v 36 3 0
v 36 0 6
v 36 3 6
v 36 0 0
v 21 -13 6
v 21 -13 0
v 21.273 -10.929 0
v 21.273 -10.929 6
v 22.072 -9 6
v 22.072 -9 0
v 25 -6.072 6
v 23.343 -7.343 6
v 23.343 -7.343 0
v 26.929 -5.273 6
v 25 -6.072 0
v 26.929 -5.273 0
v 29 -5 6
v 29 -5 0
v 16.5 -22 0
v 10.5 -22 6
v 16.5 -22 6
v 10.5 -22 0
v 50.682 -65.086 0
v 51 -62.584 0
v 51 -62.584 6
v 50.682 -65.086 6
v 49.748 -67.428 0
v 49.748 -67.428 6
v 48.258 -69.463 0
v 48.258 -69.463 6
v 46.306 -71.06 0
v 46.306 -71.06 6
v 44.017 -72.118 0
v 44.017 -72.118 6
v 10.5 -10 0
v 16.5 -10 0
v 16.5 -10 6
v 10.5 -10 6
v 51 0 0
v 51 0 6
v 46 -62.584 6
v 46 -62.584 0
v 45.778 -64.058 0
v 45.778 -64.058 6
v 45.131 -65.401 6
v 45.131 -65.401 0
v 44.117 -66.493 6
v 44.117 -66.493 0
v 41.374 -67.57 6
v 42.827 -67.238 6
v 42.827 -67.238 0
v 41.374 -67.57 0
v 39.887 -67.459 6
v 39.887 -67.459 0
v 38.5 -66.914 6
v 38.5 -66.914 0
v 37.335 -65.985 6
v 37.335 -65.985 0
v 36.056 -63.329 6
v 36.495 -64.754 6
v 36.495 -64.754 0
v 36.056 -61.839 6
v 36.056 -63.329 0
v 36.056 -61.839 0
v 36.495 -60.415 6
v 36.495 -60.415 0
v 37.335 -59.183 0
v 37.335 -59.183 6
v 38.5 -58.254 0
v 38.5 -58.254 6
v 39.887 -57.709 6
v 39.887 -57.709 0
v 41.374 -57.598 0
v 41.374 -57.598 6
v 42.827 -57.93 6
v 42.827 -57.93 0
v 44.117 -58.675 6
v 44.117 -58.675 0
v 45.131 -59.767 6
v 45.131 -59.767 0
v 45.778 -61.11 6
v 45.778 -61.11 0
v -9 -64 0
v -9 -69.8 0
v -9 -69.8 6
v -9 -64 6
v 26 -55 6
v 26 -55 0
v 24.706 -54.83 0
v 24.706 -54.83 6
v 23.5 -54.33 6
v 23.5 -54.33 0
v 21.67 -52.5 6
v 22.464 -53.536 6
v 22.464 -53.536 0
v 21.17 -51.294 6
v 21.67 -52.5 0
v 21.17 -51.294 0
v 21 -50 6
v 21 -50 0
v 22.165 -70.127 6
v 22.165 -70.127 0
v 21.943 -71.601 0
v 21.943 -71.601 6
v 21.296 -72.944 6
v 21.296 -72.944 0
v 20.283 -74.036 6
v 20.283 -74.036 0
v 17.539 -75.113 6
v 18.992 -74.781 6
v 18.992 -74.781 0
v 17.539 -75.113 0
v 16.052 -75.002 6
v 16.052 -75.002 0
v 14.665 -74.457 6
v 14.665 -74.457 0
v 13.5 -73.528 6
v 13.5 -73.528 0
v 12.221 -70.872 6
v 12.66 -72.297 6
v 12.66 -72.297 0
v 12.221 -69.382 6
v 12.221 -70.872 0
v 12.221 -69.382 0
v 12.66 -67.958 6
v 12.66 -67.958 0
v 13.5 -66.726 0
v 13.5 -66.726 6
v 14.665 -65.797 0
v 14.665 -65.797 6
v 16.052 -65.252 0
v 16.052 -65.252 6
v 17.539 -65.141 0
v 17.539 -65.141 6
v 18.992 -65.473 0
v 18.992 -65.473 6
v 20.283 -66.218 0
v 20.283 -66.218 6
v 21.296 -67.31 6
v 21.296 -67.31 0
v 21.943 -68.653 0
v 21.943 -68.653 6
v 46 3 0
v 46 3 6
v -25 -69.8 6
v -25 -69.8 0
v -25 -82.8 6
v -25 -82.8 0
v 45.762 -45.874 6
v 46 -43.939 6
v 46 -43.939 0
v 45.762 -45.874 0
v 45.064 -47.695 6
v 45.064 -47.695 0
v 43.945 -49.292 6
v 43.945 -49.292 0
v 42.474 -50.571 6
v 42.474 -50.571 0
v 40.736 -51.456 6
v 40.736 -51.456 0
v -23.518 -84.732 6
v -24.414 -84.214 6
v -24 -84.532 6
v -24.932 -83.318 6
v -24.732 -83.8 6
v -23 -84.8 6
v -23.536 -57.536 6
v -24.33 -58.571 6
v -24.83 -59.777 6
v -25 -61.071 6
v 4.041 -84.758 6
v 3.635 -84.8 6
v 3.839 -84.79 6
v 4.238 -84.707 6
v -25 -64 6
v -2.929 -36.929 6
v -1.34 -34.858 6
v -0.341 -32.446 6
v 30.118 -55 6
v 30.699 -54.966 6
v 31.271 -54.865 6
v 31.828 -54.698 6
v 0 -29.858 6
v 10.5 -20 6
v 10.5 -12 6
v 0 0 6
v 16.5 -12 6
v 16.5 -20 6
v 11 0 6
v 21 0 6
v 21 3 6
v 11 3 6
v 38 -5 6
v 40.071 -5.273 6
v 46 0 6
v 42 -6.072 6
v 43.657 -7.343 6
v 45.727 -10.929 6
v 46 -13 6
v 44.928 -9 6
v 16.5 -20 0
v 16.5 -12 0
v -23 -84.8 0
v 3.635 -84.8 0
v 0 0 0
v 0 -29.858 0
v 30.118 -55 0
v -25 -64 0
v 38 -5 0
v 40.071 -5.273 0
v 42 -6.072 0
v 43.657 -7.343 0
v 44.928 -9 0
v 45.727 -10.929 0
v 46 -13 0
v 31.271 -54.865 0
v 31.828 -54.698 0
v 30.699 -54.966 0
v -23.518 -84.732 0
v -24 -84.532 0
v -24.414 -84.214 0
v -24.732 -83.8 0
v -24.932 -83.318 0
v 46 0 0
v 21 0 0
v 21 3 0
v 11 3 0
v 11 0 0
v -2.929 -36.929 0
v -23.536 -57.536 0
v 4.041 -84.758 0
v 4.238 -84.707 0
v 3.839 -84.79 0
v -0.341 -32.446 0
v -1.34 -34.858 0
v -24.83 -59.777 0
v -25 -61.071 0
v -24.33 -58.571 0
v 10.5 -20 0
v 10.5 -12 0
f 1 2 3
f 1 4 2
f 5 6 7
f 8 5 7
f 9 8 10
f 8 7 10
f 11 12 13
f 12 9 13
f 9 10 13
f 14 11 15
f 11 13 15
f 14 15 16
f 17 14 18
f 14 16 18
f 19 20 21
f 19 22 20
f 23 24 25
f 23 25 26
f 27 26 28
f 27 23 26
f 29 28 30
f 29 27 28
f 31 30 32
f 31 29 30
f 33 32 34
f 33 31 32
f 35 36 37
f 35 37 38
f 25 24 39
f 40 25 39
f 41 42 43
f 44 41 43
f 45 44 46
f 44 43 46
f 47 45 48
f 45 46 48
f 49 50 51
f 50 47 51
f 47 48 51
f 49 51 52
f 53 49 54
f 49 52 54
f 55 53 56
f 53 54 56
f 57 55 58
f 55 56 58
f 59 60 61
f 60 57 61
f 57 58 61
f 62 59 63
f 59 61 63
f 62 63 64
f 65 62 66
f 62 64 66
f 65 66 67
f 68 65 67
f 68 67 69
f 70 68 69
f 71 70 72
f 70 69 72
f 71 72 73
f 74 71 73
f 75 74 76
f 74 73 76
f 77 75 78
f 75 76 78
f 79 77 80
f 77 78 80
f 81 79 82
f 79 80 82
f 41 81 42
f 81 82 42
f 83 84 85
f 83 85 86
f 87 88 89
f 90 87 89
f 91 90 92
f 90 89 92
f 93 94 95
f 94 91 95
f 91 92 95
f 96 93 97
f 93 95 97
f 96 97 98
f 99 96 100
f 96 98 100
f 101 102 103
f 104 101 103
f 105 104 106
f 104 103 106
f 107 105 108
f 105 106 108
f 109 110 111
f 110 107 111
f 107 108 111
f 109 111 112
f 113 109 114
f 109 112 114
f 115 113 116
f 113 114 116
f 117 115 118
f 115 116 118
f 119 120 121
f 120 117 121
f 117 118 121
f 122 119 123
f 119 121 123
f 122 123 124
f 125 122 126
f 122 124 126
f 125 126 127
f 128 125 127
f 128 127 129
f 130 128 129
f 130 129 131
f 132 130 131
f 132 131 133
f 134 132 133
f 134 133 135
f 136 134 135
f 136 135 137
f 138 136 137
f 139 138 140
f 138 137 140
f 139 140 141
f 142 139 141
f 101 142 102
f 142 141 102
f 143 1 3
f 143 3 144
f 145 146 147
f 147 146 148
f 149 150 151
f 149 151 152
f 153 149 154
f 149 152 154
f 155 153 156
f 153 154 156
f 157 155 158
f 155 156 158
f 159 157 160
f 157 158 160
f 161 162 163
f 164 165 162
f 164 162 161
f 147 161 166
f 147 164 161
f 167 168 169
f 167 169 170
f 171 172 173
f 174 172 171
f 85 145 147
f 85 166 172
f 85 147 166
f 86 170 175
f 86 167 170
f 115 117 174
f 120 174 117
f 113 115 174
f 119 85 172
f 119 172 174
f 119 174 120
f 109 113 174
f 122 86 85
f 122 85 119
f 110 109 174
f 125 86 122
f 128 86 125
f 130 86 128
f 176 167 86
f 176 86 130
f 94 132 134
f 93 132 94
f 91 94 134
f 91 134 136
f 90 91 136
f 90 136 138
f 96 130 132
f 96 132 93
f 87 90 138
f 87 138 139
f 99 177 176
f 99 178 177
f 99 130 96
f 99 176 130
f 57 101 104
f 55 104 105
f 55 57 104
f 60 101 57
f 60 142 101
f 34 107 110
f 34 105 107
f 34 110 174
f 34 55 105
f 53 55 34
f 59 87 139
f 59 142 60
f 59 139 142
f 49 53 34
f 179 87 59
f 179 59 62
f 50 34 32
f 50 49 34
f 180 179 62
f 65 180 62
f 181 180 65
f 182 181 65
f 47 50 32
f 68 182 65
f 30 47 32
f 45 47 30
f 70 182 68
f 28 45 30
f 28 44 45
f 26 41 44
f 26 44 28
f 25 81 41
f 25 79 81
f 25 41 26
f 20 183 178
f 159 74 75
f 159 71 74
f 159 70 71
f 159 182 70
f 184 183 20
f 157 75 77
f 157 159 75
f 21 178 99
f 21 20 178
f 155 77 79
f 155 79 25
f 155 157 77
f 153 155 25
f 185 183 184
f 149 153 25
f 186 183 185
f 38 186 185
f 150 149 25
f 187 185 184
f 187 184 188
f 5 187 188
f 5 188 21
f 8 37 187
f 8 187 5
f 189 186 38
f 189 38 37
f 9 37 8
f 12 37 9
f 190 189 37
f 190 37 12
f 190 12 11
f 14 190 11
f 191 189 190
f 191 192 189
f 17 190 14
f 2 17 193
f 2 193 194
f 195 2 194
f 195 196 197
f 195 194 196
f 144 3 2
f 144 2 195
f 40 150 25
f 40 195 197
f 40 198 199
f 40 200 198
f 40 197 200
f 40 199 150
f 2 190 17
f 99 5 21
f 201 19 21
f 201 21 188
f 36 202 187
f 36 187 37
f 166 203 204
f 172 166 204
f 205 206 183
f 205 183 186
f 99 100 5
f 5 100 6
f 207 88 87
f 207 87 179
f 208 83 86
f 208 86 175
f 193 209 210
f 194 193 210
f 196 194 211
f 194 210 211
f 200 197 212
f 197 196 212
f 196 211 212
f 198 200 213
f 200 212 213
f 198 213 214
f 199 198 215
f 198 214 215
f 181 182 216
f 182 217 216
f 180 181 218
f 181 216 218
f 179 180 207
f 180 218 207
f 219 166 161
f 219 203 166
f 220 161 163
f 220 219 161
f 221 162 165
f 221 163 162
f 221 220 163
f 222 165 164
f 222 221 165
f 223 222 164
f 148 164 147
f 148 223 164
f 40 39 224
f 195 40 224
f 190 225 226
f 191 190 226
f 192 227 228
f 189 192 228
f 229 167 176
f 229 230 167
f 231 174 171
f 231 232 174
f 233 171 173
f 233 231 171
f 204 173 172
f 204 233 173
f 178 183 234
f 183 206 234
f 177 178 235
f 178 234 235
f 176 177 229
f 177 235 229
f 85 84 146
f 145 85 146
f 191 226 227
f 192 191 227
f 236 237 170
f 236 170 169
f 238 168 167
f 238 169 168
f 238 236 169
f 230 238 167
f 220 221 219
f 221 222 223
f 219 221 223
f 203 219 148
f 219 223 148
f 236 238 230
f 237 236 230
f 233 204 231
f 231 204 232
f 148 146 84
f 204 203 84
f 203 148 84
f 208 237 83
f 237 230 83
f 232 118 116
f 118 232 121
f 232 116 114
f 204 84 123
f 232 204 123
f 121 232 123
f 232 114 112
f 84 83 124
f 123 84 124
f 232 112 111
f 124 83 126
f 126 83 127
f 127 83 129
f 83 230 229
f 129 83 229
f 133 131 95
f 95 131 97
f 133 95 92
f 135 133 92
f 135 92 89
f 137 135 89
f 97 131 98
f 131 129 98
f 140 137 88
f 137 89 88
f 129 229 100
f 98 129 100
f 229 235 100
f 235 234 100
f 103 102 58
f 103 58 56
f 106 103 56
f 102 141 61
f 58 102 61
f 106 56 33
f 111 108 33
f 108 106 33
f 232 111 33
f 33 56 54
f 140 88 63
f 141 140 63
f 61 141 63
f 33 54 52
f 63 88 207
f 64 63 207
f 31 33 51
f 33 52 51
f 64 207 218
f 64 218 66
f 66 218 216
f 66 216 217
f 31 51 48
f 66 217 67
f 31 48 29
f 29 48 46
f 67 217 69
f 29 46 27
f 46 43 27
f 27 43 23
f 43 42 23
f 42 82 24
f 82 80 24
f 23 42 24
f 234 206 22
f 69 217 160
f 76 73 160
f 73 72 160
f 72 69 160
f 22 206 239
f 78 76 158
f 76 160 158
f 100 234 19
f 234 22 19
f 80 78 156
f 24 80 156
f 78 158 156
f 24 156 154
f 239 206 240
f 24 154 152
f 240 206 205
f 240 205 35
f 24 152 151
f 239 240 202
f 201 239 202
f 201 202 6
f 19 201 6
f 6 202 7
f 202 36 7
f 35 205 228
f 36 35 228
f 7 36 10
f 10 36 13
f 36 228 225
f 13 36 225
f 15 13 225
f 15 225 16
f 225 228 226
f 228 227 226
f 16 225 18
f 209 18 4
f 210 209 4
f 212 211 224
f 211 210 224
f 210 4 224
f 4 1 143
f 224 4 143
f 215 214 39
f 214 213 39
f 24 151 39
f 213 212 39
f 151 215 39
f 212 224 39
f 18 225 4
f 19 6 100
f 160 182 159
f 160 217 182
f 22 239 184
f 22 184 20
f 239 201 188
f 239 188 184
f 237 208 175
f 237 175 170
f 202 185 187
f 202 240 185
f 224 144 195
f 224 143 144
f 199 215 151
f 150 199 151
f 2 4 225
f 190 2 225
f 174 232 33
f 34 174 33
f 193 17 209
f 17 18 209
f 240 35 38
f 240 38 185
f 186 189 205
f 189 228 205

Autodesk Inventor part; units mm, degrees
ref_plane "YZ Plane" through (0, 0, 0) normal (1, 0, 0) x (0, 1, 0)
ref_plane "XZ Plane" through (0, 0, 0) normal (0, 1, 0) x (-1, 0, 0)
ref_plane "XY Plane" through (0, 0, 0) normal (0, 0, 1) x (1, 0, 0)
sketch "Sketch1" plane through (0, 0, 0) normal (0, 0, 1) x (1, 0, 0)
  line L0 (51, -62.5841) -> (51, 0)
  line L1 (21, 0) -> (21, 3)
  line L2 (21, 3) -> (11, 3)
  line L3 (11, 3) -> (11, 0)
  line L4 (36, 0) -> (36, 3)
  line L5 (36, 3) -> (46, 3)
  line L6 (46, 3) -> (46, 0)
  line L7 (51, 0) -> (46, 0)
  line L8 (36, 0) -> (21, 0)
  line L9 (11, 0) -> (0, 0)
  line L10 (-9, -69.8) -> (-25, -69.8)
  line L11 (-9, -64) -> (-25, -64)
  line L12 (-9, -69.8) -> (-9, -64)
  line L13 (-25, -69.8) -> (-25, -82.8)
  line L14 (29, -5) -> (38, -5)
  line L15 (46, -13) -> (46, -43.9388)
  line L16 (21, -50) -> (21, -13)
  arc A0 (29, -5) -> (21, -13) centre (29, -13) ccw
  arc A1 (46, -13) -> (38, -5) centre (38, -13) ccw
  line L17 (4.2384, -84.7068) -> (44.0172, -72.118)
  line L18 (26, -55) -> (30.1184, -55)
  line L19 (31.8285, -54.6985) -> (40.7362, -51.4563)
  arc A2 (21, -50) -> (26, -55) centre (26, -50) ccw
  arc A3 (30.1184, -55) -> (31.8285, -54.6985) centre (30.1184, -50) ccw
  arc A4 (40.7362, -51.4563) -> (46, -43.9388) centre (38, -43.9388) ccw
  arc A5 (44.0172, -72.118) -> (51, -62.5841) centre (41, -62.5841) ccw
  circle A6 centre (17.1651, -70.1271) radius 5
  circle A7 centre (41, -62.5841) radius 5
  line L20 (-25, -64) -> (-25, -61.0711)
  line L21 (-23.5355, -57.5355) -> (-2.9289, -36.9289)
  line L22 (0, -29.8579) -> (0, 0)
  arc A8 (-2.9289, -36.9289) -> (0, -29.8579) centre (-10, -29.8579) ccw
  arc A9 (-23.5355, -57.5355) -> (-25, -61.0711) centre (-20, -61.0711) ccw
  line L23 (-23, -84.8) -> (3.635, -84.8)
  arc A10 (-25, -82.8) -> (-23, -84.8) centre (-23, -82.8) ccw
  arc A11 (3.635, -84.8) -> (4.2384, -84.7068) centre (3.635, -82.8) ccw
  point P0 (0, 0)
  point P1 (16, 3)
  point P2 (41, 3)
  point P3 (51, -69.9082)
  point P4 (-25, -84.8)
  point P5 (46, -49.5404)
  point P6 (21, -55)
  point P7 (31, -55)
  point P8 (-25, -59)
  point P9 (0, -34)
  dimension "d17" = 10
  dimension "d18" = 3
  dimension "d20" = 10
  dimension "d21" = 3
  dimension "d22" = 5
  dimension "d23" = 15
  dimension "d24" = 3
  dimension "d25" = 3
  dimension "d75" = 90
  dimension "d129" = 64
  dimension "d130" = 16
  dimension "d131" = 60
  dimension "d139" = 5.8
  dimension "d148" = 5
  dimension "d149" = 5
  dimension "d152" = 8
  dimension "d162" = 10
  dimension "d164" = 160
  dimension "d167" = 55
  dimension "d169" = 5
  dimension "d170" = 5
  dimension "d171" = 8
  dimension "d173" = 10
  dimension "d184" = 5
  dimension "d185" = 30
  dimension "d186" = 135
  dimension "d187" = 10
  dimension "d188" = 5
  dimension "d189" = 25
  dimension "d190" = 15
  dimension "d191" = 25
  dimension "d192" = 2
extrude "Extrusion10" add sketch "Sketch1" along normal blind 6
sketch "Sketch3" plane through (0, 0, 0) normal (0, 0, -1) x (-1, 0, 0)
  line L0 (0, -29.8579) -> (0, 0) construction
  line L1 (-21, -50) -> (-21, -13) construction
  line L2 (-21, -13) -> (-21, -50) construction
  line L3 (0, 0) -> (-11, 0) construction
  line L4 (-10.5, -12) -> (-16.5, -12)
  line L5 (-16.5, -12) -> (-16.5, -10)
  line L6 (-16.5, -10) -> (-10.5, -10)
  line L7 (-10.5, -10) -> (-10.5, -12)
  line L8 (-10.5, -22) -> (-16.5, -22)
  line L9 (-16.5, -22) -> (-16.5, -20)
  line L10 (-16.5, -20) -> (-10.5, -20)
  line L11 (-10.5, -20) -> (-10.5, -22)
  point P0 (-13.5, -10)
  dimension "d204" = 2
  dimension "d205" = 6
  dimension "d206" = 8
  dimension "d207" = 4.5
extrude "Extrusion12" cut sketch "Sketch3" against normal through all
properties part number "Handle 27021014"
